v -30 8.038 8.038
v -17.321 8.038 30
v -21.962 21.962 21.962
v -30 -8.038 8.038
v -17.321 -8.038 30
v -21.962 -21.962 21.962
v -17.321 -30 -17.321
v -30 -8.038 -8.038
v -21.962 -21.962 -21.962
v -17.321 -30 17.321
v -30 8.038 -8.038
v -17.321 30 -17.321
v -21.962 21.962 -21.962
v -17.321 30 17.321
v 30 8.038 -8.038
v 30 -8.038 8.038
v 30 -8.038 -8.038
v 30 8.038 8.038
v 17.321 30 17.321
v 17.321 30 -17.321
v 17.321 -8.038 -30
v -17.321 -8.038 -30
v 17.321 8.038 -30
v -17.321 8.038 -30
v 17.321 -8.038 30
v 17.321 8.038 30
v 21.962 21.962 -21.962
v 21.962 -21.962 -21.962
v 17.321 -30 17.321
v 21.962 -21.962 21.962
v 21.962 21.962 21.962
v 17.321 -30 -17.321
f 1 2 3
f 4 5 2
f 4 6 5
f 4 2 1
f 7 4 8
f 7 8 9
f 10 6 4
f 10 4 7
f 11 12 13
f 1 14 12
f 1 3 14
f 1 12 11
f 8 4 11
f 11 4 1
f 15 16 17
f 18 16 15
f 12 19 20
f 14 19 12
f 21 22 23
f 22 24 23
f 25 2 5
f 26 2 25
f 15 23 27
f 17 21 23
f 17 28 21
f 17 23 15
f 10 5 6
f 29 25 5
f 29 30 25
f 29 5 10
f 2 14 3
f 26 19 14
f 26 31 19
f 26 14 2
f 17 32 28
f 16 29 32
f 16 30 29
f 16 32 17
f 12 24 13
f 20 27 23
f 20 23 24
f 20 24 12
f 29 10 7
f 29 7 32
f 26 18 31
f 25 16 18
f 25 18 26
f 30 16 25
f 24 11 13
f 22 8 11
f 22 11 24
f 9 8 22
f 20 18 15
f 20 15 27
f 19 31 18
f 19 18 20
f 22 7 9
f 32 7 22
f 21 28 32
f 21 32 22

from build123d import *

# Parameters (mm, degrees)
F3_DEPTH = 30
F4_DEPTH = 30
F5_DEPTH = 30


with BuildPart() as f3:
    # F0 (on Top) → F3 (new body, symmetric)
    with BuildSketch(Plane.XY):
        Polygon((17.320508, 30), (-17.320508, 30), (-34.641016, 0), (-17.320508, -30), (17.320508, -30), (34.641016, 0), align=None)
    extrude(amount=F3_DEPTH, both=True)

    # F1 (on Right) → F4 (intersect, symmetric)
    with BuildSketch(Plane.YZ):
        Polygon((30, -17.320508), (30, 17.320508), (0, 34.641016), (-30, 17.320508), (-30, -17.320508), (0, -34.641016), align=None)
    extrude(amount=F4_DEPTH, both=True, mode=Mode.INTERSECT)

    # F2 (on Front) → F5 (intersect, symmetric)
    with BuildSketch(Plane.XZ):
        Polygon((17.320508, 30), (-17.320508, 30), (-34.641016, 0), (-17.320508, -30), (17.320508, -30), (34.641016, 0), align=None)
    extrude(amount=F5_DEPTH, both=True, mode=Mode.INTERSECT)


solid = f3.part
